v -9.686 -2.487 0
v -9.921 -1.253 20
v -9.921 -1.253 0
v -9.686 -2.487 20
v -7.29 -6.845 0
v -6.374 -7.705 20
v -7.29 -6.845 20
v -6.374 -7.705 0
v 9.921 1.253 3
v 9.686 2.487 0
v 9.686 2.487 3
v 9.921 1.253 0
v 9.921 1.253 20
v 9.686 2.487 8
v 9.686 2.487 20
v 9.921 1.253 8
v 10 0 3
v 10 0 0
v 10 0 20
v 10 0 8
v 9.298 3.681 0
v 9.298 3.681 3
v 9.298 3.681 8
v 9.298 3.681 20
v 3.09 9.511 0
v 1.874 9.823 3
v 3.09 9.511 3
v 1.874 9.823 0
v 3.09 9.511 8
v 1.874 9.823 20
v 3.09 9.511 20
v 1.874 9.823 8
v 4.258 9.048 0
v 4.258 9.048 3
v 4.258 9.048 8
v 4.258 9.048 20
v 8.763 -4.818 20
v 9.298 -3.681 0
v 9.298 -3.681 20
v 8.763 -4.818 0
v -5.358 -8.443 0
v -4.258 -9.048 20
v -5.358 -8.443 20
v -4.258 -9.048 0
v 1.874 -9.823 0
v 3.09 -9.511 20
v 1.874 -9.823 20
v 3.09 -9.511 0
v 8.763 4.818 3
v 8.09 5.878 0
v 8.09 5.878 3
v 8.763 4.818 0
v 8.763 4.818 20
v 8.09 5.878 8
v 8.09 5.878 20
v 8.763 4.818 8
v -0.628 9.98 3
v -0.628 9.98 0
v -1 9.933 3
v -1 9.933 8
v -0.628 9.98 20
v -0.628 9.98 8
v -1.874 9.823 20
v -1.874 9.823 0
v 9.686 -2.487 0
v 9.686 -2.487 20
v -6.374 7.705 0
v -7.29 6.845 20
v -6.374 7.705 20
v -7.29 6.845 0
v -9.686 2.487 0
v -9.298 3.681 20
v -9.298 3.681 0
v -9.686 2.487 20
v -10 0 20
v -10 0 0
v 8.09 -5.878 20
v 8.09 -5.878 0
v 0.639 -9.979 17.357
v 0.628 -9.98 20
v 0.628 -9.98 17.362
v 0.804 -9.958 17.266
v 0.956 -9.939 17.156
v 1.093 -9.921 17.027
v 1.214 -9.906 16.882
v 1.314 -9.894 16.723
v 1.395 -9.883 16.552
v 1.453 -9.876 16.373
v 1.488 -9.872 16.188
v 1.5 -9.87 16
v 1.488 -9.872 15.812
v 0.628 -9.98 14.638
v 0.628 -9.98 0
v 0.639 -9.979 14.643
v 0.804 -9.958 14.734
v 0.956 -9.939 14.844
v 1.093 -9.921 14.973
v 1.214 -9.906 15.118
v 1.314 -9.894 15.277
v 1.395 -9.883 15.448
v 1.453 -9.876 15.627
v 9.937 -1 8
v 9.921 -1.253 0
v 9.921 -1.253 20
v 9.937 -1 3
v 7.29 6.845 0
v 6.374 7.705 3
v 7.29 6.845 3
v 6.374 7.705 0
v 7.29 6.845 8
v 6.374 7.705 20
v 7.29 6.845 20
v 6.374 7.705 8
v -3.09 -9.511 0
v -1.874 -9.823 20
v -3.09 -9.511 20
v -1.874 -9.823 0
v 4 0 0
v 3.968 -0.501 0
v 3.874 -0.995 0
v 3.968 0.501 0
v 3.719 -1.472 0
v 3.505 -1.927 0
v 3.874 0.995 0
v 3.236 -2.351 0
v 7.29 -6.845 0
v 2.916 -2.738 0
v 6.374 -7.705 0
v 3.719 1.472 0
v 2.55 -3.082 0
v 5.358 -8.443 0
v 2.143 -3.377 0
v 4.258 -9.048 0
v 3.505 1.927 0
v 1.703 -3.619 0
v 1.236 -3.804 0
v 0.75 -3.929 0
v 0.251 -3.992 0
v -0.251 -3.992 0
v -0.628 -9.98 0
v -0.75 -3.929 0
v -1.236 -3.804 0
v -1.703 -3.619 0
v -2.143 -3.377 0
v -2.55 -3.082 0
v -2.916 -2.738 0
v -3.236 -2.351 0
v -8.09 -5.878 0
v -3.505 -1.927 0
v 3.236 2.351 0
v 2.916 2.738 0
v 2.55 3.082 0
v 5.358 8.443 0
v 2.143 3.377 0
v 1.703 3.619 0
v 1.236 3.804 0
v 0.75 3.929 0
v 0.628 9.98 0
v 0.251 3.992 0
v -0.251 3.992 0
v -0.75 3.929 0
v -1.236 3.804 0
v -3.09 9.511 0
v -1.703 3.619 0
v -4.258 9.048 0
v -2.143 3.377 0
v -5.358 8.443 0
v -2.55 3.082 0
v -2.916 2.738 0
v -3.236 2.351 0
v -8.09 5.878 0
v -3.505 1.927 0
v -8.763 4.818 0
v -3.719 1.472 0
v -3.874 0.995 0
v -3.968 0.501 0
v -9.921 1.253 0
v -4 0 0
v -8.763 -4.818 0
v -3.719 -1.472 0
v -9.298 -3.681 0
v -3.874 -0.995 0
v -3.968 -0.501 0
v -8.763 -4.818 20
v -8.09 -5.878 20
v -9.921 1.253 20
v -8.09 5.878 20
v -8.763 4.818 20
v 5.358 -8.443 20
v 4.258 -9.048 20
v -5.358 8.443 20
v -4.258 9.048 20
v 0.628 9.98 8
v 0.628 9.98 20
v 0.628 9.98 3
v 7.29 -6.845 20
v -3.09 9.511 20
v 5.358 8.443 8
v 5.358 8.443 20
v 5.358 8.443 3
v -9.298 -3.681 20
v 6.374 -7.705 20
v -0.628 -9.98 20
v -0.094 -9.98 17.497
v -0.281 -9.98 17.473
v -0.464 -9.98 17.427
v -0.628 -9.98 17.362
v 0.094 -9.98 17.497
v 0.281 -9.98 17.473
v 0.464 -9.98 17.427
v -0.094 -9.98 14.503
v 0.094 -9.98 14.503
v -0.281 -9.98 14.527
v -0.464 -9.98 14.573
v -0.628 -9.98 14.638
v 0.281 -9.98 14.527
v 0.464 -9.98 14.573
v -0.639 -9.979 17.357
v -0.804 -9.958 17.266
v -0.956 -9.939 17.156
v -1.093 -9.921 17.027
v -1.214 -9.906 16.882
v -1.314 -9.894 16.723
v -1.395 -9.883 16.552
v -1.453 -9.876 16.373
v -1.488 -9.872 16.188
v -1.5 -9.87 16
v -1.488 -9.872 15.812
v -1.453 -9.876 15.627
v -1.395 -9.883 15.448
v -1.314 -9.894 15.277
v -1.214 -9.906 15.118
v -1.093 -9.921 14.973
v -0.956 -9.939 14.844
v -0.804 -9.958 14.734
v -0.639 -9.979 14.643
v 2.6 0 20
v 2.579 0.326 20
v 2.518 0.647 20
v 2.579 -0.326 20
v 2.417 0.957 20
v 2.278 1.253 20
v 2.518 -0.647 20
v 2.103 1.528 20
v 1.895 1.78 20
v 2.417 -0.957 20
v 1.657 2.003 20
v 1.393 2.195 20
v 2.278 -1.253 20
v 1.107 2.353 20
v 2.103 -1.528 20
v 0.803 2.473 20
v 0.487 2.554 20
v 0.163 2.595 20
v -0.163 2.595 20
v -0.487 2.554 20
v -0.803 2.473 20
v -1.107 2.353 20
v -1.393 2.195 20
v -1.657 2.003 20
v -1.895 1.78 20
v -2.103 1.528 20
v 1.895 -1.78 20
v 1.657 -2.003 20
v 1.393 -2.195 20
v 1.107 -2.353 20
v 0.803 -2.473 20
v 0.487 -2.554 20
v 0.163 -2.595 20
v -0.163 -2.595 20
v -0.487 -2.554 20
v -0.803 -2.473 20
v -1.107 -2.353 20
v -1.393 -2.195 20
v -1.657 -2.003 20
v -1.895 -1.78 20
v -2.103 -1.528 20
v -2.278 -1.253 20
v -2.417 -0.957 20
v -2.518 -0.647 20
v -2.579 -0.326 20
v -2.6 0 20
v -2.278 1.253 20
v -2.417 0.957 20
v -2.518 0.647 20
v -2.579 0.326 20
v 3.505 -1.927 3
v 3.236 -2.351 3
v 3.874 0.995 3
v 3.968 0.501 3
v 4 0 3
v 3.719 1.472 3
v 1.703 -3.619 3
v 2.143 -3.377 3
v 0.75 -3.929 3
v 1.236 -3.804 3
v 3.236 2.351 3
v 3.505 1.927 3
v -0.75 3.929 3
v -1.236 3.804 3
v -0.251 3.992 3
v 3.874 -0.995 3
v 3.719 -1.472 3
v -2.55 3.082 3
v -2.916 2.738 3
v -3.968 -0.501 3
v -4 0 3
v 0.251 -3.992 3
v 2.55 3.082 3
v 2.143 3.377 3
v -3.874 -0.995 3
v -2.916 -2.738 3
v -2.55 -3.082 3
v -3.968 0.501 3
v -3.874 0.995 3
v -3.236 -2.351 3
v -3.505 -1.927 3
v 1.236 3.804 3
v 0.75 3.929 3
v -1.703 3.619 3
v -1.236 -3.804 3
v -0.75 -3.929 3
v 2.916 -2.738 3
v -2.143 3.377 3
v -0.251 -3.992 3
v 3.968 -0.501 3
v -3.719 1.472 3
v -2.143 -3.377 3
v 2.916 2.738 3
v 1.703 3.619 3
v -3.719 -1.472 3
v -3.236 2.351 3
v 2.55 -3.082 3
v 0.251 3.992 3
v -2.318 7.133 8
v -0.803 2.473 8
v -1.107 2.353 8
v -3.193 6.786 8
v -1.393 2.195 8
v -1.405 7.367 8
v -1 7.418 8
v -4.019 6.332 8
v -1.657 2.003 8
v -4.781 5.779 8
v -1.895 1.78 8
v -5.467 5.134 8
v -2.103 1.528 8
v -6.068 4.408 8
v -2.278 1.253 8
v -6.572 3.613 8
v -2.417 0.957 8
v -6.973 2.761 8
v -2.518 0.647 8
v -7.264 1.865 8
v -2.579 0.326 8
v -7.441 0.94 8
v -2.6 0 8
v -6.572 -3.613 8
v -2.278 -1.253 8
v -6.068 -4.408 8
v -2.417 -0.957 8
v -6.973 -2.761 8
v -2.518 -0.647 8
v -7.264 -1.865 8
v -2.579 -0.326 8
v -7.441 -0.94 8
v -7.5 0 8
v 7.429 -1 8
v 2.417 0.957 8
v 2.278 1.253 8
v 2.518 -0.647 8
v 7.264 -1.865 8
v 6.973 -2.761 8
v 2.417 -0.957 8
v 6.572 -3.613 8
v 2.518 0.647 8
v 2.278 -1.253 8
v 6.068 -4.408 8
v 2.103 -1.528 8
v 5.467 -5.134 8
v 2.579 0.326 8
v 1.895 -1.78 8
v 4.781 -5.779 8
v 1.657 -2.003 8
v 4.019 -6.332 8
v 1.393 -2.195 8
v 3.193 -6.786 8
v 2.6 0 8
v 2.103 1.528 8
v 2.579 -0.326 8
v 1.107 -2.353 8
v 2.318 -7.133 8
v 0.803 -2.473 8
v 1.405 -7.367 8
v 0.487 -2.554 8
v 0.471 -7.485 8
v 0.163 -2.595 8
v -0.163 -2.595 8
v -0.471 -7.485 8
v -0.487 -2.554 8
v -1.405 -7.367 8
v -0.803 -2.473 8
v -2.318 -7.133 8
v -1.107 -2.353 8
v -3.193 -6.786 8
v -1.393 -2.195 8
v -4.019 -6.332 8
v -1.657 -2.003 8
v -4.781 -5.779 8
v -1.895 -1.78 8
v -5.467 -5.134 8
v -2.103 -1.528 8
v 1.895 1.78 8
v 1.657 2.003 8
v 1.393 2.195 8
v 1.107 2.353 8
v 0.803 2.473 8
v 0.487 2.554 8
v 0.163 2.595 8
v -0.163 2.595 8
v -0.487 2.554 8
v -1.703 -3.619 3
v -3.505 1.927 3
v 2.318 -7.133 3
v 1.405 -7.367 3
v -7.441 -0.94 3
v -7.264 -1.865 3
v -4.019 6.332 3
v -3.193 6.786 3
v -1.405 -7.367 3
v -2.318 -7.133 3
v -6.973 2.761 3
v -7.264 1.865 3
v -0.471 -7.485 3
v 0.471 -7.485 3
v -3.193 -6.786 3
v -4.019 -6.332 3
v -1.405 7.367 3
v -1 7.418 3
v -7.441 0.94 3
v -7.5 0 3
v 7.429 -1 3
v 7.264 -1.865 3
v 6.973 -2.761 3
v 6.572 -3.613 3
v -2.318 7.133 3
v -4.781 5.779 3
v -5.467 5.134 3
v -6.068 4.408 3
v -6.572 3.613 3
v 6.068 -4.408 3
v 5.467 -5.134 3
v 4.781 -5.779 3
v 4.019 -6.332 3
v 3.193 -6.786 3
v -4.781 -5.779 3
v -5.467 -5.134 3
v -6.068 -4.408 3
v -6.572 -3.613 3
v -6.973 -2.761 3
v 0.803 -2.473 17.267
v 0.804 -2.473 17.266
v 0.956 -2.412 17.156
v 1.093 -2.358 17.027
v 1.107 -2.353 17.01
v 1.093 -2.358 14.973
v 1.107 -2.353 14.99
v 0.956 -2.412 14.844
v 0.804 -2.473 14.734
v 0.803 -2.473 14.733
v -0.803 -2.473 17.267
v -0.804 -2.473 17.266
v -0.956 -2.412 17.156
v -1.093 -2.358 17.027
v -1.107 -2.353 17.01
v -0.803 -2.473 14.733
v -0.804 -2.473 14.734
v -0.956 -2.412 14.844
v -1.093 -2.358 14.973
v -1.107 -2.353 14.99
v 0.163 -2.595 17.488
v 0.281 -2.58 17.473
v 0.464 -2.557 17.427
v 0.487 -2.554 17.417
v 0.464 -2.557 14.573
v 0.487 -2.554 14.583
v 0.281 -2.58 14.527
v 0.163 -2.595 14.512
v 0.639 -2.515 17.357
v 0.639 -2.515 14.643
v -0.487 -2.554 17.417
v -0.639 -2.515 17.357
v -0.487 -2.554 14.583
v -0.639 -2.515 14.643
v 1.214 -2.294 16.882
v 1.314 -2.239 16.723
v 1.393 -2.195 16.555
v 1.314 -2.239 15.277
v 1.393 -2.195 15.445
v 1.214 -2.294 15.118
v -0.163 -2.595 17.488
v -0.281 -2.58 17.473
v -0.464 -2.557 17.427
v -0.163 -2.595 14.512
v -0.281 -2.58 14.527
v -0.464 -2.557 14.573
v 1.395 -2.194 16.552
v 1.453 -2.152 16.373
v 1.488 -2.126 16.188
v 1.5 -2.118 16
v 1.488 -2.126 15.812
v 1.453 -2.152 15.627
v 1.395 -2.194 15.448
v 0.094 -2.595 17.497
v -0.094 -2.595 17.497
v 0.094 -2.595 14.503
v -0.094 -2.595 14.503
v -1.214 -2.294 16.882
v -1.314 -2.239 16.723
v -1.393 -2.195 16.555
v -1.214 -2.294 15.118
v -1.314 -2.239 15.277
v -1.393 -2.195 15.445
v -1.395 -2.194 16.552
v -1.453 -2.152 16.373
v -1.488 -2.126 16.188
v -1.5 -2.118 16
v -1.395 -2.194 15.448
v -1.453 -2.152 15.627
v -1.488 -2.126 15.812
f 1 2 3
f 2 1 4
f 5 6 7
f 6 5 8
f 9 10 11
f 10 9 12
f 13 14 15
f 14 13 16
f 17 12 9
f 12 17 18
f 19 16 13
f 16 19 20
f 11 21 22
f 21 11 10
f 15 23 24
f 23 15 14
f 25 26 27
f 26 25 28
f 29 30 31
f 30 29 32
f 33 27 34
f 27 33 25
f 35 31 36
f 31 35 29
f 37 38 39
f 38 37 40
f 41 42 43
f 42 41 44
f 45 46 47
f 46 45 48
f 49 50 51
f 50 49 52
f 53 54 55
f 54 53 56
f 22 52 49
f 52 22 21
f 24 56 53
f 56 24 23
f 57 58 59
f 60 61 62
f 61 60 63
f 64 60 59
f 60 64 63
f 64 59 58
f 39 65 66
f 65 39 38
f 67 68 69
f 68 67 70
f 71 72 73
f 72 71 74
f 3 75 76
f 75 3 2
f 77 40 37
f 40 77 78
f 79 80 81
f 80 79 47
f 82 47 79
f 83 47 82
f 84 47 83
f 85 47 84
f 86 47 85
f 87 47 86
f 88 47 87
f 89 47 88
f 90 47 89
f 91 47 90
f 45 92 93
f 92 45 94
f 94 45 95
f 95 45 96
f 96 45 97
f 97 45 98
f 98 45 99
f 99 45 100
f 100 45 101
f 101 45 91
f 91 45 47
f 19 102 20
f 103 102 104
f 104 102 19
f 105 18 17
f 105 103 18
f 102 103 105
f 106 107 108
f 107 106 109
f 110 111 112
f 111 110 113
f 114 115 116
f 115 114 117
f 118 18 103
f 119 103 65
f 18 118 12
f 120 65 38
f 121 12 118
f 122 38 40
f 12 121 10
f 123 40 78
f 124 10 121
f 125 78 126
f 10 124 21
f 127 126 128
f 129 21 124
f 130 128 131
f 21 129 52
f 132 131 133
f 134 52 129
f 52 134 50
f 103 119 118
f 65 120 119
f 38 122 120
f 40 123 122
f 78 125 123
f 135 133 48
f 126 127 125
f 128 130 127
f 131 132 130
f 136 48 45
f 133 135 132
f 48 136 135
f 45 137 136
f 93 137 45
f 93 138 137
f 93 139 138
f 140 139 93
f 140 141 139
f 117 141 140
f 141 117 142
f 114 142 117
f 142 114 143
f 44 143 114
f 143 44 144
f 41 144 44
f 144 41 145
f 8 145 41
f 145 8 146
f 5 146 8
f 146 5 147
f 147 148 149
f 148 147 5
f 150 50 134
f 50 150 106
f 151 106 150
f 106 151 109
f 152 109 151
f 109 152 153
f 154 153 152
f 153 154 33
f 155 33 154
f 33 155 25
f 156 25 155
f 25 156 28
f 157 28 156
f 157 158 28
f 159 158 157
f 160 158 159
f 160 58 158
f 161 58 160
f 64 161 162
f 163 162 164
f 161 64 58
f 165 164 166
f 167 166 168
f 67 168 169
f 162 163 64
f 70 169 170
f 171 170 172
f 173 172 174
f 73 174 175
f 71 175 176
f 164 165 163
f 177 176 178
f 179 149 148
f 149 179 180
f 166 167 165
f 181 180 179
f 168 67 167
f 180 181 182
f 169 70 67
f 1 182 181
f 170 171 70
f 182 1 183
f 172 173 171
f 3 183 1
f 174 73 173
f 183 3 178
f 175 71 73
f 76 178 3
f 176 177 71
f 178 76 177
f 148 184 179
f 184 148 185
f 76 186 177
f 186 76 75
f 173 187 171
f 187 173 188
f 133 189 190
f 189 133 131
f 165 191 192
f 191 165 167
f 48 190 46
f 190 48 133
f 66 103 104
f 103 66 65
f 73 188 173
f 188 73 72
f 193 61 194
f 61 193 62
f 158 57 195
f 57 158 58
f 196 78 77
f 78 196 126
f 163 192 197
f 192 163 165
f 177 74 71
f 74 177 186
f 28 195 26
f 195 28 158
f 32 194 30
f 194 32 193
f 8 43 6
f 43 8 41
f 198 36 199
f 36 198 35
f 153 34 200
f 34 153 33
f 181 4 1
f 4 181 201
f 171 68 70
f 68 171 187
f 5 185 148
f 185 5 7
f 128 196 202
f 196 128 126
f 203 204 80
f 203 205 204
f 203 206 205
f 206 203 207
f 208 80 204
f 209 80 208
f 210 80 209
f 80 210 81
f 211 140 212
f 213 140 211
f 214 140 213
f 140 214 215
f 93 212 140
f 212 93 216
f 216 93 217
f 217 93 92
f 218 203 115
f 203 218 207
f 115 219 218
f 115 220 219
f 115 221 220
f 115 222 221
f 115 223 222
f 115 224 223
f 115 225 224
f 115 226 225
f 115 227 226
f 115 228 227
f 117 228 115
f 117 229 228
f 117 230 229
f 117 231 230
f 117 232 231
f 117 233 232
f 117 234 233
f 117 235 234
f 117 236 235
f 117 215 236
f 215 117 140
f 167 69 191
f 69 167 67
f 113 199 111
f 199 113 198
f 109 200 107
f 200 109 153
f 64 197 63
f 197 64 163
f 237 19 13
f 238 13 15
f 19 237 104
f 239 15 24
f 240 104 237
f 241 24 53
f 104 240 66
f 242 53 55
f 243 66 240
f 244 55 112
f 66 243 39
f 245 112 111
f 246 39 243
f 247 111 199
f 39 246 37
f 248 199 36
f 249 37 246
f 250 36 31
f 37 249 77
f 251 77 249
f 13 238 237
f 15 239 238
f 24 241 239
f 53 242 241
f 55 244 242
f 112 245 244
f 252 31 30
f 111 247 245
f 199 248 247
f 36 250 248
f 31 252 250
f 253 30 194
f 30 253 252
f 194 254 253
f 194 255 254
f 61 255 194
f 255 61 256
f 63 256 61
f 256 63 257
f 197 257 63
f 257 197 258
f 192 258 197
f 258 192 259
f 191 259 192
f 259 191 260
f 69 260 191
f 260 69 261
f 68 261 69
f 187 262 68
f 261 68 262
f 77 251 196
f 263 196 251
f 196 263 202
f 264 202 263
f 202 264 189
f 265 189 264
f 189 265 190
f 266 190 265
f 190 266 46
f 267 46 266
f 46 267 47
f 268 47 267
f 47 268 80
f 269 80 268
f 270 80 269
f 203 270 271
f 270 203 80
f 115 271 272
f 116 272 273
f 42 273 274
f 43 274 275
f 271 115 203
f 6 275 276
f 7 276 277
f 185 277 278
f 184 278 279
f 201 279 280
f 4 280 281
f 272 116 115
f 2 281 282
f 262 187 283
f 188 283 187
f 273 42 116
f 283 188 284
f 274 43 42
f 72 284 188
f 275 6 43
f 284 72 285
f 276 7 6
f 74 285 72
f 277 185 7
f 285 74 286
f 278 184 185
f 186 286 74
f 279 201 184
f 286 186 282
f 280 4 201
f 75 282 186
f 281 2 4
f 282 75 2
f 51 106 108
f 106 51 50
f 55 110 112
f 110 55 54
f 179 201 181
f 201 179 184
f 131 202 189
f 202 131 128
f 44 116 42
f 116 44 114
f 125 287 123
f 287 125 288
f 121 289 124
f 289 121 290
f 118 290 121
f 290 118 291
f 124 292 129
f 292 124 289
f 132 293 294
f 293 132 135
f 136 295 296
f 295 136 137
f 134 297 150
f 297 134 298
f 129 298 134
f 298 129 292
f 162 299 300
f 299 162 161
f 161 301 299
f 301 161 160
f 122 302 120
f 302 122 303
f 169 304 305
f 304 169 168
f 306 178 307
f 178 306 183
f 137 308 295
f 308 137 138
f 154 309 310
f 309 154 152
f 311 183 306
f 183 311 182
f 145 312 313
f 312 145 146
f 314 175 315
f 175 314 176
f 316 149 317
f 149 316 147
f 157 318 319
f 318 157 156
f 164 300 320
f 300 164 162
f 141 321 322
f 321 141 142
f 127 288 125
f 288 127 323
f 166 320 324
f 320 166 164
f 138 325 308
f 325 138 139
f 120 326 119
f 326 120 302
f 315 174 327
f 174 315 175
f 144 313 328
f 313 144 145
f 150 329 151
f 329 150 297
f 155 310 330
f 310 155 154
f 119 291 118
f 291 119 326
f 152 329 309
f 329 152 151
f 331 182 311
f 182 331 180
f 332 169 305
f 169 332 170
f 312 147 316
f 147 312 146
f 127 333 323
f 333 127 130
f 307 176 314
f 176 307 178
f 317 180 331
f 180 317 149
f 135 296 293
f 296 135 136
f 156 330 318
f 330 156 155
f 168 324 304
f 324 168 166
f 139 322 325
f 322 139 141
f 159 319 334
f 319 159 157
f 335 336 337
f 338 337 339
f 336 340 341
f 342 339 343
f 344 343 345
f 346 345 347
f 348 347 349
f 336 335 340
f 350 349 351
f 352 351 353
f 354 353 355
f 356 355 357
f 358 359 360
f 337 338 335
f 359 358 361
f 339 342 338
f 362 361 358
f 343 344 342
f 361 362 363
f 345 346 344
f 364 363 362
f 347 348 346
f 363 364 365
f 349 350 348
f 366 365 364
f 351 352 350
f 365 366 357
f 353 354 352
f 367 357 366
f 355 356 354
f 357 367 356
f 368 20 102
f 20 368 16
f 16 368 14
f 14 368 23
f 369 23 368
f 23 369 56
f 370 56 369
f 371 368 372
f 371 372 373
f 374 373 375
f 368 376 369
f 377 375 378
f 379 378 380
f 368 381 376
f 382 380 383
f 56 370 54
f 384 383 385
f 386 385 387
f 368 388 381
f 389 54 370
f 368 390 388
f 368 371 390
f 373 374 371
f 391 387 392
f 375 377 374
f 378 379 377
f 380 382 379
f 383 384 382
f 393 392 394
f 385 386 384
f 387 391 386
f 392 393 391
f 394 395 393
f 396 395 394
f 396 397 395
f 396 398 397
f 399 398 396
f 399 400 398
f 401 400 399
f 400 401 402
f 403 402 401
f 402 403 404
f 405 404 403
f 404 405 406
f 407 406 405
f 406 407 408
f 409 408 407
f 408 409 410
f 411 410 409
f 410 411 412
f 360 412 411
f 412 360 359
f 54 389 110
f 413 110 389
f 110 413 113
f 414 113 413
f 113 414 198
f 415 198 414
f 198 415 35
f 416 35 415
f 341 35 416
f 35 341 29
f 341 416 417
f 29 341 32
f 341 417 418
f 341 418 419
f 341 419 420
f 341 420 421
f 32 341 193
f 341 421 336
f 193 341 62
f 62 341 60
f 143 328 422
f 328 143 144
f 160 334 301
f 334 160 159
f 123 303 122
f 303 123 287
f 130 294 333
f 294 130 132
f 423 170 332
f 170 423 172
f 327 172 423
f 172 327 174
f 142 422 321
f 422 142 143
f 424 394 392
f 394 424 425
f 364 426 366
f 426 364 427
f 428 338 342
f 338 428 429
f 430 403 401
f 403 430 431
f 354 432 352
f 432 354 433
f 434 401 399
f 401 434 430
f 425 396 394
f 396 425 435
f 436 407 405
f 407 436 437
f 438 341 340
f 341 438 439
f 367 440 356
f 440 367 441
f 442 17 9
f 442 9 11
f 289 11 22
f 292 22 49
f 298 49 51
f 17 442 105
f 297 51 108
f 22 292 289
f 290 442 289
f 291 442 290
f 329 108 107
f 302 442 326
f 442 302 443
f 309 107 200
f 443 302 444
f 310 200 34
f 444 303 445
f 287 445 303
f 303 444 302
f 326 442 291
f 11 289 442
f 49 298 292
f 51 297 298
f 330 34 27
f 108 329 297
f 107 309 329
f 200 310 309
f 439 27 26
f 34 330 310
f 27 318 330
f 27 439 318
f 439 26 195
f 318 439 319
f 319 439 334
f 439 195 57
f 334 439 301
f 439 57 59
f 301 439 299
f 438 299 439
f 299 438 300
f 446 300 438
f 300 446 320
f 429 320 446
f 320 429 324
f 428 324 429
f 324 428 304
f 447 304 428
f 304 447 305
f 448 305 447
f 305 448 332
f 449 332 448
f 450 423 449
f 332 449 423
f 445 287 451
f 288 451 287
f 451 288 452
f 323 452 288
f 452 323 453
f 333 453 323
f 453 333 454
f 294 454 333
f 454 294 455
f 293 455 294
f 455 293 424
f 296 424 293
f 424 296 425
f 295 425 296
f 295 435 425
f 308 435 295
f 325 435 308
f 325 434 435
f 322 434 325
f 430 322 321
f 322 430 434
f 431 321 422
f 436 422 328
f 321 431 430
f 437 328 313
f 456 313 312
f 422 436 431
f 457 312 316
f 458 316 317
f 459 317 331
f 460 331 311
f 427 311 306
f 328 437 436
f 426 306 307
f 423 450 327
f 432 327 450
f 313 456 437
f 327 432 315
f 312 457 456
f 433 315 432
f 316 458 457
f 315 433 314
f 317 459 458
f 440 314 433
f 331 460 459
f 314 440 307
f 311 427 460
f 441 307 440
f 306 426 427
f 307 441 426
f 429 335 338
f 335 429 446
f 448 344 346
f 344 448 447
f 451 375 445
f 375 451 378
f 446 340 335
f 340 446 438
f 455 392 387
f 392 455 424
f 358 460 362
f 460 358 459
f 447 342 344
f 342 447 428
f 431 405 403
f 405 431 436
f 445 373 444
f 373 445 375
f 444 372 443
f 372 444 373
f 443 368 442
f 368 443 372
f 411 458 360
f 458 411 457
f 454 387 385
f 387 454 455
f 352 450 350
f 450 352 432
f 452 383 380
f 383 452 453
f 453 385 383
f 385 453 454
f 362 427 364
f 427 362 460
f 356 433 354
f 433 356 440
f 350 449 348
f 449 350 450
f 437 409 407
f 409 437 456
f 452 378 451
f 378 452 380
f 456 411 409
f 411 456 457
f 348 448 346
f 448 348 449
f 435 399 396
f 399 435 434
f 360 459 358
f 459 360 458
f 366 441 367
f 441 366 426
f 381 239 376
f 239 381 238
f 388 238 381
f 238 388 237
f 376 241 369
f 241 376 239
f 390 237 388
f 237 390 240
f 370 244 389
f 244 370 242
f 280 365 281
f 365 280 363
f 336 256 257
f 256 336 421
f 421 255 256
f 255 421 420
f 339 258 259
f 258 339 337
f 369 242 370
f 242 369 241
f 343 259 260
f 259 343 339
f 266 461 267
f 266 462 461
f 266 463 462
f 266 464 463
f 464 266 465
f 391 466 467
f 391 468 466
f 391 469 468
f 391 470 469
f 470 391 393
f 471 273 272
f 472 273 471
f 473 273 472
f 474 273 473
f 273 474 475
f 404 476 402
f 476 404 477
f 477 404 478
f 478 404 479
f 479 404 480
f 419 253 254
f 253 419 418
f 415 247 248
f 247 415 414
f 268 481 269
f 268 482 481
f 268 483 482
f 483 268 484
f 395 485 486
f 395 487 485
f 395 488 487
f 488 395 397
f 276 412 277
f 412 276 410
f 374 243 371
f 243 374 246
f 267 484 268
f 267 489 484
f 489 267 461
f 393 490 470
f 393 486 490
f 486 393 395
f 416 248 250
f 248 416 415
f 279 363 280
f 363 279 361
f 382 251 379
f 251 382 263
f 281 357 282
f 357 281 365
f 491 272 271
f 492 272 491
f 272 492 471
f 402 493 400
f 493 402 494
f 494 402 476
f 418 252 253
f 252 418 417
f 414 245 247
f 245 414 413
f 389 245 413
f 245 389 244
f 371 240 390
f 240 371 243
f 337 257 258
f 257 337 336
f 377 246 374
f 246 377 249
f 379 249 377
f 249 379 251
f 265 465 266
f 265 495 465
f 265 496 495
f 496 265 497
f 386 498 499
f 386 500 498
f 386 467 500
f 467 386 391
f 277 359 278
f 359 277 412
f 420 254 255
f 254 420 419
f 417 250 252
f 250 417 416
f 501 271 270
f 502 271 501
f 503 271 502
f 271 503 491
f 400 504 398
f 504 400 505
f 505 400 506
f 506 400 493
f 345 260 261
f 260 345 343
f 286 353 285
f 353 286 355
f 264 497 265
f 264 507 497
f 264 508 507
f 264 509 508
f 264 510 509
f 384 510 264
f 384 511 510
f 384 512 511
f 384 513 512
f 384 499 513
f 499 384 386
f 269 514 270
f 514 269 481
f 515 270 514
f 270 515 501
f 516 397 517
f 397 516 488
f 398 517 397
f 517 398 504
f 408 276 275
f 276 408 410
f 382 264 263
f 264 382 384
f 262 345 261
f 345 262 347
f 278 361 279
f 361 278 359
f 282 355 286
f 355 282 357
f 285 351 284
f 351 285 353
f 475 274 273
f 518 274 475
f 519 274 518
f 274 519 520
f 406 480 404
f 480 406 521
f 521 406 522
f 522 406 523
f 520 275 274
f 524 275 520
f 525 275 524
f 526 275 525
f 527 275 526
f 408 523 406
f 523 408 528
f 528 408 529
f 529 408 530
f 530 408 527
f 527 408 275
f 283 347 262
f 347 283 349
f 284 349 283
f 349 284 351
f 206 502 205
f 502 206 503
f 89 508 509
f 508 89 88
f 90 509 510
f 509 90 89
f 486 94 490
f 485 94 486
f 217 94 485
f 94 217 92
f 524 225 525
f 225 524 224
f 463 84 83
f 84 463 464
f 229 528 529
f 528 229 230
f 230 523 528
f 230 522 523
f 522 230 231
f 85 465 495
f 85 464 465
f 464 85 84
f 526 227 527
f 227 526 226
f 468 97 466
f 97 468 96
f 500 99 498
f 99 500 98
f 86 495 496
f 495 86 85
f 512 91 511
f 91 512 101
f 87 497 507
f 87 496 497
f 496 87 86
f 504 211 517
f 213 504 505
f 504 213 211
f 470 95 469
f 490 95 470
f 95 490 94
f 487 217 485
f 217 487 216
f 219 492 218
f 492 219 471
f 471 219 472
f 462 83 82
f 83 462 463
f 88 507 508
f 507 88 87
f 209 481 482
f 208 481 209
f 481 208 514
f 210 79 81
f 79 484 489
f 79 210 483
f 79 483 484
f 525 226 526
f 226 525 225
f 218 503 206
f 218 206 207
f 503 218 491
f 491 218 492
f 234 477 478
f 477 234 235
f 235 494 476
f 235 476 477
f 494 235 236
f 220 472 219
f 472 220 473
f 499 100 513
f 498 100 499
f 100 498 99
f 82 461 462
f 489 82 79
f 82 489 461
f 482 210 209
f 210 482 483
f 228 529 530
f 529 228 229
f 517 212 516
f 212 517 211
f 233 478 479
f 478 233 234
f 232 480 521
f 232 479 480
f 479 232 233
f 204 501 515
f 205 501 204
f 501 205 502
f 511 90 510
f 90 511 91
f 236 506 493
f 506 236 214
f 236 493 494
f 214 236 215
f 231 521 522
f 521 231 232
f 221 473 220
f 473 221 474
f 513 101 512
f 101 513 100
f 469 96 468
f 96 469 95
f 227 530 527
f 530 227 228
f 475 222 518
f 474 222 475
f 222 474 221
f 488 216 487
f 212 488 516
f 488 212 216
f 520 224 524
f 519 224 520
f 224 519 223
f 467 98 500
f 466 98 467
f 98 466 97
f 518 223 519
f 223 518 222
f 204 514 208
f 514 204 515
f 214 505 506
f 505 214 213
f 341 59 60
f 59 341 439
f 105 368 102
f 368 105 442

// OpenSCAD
$fn = 50;

module threaded(h=1000,r=4){
color("silver")
cylinder(r=r,h=h);
}



module coupler(){

difference(){
color("white") cylinder(r=10,h=20);

translate([0,0,-1])
color("white") cylinder(r=4,h=9);

translate([0,0,3])
color("white") cylinder(r=7.5,h=5);


translate([0,0,0])
color("white") cylinder(r=2.6,h=26);

translate([0,0,16])
rotate([90,0,0])
color("white") cylinder(r=1.5,h=16);


translate([-1,-1,3])
color("white") cube([12,18,5]);


}

}




coupler();
